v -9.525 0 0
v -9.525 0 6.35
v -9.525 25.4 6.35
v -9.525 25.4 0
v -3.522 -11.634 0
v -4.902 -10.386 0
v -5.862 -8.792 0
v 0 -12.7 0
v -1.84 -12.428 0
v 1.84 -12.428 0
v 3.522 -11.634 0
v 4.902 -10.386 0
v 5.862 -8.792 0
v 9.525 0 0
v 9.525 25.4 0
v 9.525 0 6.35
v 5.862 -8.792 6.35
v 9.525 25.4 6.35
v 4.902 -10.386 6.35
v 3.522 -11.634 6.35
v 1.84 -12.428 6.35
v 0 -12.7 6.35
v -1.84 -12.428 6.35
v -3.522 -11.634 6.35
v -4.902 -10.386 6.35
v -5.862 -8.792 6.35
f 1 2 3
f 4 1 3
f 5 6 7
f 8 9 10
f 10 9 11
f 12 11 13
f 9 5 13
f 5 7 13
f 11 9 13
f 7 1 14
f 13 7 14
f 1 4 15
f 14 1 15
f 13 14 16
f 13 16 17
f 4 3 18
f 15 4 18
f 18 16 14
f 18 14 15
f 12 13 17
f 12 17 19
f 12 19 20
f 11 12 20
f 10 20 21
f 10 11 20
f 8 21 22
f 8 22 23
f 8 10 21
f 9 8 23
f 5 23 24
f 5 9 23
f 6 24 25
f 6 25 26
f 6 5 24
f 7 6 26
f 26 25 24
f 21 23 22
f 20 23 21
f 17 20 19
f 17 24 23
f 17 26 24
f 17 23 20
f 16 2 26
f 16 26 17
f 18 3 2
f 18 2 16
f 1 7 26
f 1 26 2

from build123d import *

# Parameters (mm, degrees)
BOSS_EXTRUDE1_DEPTH = 6.35
SKETCH2_W           = 19.05
SKETCH2_H           = 25.4
BOSS_EXTRUDE2_DEPTH = 6.35


with BuildPart() as part:
    # Sketch1 → Boss-Extrude1 (new body)
    with BuildSketch(Plane.XY):
        with BuildLine():
            Line((-9.525, 0), (9.525, 0))
            Line((9.525, 0), (5.861538462, -8.792307692))
            ThreePointArc((5.861538462, -8.792307692), (0, -12.7), (-5.861538462, -8.792307692))
            Line((-5.861538462, -8.792307692), (-9.525, 0))
        make_face()
    extrude(amount=BOSS_EXTRUDE1_DEPTH)

    # Sketch2 → Boss-Extrude2 (add)
    with BuildSketch(Plane.XY.offset(6.35)):
        with Locations((0, 12.7)):
            Rectangle(SKETCH2_W, SKETCH2_H)
    extrude(amount=-BOSS_EXTRUDE2_DEPTH)


solid = part.part
